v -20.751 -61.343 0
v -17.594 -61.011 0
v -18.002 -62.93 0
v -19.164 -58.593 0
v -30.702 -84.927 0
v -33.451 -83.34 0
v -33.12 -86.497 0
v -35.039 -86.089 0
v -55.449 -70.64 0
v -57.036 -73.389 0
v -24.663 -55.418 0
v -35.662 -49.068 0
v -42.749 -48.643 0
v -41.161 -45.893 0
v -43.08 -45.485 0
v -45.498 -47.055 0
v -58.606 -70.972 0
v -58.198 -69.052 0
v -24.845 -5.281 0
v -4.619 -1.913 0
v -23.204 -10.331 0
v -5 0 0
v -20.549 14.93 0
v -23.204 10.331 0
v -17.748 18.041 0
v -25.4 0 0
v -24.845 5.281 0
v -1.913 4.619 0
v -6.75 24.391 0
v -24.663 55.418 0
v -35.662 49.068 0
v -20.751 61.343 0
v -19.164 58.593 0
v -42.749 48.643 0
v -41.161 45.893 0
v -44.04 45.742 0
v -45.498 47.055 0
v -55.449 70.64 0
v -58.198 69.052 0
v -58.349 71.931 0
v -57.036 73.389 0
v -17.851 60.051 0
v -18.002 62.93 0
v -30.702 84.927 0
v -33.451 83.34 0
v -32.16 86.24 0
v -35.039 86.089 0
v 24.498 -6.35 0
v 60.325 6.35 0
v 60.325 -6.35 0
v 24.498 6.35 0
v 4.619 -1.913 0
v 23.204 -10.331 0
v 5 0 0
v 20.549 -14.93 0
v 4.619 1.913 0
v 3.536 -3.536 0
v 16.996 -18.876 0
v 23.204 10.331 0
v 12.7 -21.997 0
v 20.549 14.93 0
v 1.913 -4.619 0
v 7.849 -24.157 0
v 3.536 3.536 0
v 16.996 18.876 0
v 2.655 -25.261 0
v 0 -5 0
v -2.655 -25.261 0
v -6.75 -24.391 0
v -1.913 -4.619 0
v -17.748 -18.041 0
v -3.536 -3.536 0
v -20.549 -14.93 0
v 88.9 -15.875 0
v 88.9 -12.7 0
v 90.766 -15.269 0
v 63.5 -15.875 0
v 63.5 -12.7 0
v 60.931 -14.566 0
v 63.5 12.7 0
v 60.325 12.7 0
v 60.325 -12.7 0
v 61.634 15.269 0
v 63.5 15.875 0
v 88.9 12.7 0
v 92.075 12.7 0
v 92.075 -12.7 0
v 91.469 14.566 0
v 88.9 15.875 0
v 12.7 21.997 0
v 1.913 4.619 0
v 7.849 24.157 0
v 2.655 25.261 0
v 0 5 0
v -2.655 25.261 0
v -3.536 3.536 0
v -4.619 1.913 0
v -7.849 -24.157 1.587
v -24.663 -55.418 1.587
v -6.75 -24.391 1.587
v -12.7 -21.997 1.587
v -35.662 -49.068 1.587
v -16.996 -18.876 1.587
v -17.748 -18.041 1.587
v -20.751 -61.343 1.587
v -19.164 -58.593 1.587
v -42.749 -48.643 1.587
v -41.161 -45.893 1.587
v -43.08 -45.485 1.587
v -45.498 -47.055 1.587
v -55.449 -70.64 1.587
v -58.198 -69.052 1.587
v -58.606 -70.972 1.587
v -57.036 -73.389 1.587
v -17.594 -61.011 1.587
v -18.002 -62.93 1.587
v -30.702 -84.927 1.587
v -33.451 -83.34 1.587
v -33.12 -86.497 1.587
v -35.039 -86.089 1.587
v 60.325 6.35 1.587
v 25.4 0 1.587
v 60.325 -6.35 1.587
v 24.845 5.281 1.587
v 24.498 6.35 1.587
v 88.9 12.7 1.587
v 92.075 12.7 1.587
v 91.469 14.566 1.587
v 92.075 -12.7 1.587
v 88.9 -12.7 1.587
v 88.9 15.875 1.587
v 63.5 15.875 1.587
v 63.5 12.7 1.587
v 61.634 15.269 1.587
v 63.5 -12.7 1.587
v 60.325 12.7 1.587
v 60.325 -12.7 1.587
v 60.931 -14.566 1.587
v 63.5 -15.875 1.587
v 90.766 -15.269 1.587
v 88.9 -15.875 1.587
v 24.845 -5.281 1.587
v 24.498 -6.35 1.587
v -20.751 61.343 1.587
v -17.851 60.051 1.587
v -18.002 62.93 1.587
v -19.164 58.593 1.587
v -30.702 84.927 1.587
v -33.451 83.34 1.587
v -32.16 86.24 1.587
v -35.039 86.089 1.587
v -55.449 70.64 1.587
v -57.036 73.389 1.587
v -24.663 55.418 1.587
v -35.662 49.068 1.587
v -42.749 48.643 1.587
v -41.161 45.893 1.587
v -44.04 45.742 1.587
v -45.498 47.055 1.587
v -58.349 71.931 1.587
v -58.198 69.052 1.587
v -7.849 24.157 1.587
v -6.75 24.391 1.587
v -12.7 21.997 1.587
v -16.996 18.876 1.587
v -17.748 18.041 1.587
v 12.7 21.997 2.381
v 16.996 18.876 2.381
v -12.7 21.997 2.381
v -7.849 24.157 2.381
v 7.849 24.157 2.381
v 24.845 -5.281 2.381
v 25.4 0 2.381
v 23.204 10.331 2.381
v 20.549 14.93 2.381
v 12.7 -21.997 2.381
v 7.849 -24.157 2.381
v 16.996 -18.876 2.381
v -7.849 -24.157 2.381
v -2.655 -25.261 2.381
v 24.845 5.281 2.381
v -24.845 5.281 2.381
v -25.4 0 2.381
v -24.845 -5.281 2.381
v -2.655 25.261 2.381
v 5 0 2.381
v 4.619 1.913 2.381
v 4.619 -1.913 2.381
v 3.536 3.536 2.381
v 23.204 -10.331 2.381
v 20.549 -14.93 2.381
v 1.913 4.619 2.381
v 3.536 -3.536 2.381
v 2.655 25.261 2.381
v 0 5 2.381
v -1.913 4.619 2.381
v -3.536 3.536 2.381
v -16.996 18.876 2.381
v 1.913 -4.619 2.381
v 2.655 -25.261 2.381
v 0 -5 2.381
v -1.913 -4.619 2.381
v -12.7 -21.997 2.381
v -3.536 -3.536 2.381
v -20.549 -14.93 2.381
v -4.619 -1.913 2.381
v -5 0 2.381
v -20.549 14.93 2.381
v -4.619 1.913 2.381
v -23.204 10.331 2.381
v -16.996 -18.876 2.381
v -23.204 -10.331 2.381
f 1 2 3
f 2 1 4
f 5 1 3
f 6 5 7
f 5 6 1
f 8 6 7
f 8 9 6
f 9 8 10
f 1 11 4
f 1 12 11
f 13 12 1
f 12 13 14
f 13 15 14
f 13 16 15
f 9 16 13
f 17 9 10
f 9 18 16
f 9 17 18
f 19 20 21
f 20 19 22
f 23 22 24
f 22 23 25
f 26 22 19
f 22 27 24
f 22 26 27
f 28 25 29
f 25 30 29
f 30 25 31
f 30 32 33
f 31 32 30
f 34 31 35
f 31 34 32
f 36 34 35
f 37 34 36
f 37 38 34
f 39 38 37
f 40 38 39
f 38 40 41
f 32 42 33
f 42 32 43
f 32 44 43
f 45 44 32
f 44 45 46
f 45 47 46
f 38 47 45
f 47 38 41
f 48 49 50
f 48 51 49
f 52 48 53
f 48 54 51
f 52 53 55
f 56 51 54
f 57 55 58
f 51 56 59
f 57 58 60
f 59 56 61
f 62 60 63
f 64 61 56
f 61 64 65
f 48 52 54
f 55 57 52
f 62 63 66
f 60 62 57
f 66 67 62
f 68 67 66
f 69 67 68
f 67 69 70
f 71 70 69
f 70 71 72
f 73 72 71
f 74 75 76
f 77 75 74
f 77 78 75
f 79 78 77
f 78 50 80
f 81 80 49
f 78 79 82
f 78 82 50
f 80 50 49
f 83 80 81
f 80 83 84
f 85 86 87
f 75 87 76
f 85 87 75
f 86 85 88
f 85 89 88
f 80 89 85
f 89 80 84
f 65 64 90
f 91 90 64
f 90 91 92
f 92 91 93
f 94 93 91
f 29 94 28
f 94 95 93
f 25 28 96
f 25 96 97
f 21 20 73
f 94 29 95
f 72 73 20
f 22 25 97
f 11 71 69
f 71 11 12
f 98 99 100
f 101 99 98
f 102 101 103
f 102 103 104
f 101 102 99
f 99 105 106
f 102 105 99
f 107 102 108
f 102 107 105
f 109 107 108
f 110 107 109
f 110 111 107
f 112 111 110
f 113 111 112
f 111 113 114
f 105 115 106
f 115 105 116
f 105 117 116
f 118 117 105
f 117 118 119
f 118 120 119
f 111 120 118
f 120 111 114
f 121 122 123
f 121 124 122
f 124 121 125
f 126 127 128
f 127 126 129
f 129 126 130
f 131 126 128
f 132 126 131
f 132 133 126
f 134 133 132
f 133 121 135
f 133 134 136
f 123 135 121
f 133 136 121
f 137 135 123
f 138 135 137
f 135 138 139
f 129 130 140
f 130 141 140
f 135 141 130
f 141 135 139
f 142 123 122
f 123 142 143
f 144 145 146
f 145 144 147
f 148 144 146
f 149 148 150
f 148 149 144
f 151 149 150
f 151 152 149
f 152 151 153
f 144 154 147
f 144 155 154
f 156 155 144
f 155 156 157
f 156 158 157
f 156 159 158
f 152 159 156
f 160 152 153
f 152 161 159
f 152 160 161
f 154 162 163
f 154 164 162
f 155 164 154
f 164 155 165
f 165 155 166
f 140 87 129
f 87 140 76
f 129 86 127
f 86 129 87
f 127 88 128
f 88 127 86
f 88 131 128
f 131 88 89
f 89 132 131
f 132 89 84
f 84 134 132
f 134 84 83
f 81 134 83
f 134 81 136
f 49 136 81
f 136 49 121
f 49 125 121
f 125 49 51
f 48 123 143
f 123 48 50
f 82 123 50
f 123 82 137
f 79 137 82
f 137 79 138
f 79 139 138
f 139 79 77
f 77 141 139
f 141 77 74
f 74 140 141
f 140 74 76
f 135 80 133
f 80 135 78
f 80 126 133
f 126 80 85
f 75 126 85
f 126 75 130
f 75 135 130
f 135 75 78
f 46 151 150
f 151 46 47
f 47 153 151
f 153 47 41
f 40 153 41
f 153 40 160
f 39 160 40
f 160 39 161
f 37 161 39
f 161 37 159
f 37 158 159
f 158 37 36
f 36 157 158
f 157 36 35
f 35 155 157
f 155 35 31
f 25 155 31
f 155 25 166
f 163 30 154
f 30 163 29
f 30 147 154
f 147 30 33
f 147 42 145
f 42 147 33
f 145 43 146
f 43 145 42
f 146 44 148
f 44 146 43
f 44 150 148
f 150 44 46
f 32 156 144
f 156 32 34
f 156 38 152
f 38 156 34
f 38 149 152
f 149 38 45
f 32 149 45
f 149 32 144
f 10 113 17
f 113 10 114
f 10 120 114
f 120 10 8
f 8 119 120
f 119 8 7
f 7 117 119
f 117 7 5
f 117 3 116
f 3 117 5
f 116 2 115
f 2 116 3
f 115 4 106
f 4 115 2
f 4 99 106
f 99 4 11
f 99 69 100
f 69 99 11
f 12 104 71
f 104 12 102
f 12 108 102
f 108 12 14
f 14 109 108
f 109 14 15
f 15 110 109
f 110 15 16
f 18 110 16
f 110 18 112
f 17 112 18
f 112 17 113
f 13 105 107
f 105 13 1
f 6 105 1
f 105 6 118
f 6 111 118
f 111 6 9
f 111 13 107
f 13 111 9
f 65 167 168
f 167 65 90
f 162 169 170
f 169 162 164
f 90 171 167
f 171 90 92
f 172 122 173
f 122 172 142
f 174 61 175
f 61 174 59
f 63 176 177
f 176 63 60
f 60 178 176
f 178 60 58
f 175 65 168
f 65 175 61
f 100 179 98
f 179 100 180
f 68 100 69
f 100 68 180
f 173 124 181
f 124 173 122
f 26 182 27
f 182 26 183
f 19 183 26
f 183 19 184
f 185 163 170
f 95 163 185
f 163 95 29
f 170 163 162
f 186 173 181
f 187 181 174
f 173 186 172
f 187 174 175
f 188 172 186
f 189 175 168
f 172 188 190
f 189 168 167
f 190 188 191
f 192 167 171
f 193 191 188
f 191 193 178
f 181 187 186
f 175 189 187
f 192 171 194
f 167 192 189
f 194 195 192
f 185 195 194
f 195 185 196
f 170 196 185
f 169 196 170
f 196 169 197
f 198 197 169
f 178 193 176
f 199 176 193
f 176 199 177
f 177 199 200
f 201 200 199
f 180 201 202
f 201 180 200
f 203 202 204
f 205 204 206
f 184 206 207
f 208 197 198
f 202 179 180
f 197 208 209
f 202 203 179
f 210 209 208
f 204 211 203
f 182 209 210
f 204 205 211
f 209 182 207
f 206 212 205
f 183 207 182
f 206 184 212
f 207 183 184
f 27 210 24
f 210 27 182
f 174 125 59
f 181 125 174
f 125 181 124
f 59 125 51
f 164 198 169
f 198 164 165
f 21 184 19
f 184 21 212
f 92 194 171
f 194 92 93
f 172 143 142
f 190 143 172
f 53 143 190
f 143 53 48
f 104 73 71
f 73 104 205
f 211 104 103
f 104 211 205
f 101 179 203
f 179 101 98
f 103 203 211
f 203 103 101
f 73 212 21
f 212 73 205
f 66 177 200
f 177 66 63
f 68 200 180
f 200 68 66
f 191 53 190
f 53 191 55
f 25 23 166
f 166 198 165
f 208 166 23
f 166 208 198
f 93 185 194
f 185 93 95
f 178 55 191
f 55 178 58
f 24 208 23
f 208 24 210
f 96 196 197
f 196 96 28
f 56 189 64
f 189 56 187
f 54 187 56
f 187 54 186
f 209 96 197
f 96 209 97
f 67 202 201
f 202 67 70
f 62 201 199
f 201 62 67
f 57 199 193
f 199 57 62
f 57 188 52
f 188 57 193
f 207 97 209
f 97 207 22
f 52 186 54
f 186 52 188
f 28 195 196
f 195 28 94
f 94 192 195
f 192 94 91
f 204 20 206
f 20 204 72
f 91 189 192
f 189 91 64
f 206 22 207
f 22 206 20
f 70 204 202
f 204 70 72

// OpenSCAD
module no_more_customizer() {}

mmPerInch = 25.4;

mount_hole_diameter_mm = 10;
mount_brace_diameter_mm = 2 * mmPerInch;
mount_brace_height = mmPerInch * 3/32;
skid_pad_horz_mm = 25.4;
skid_pad_vert_mm = 25.4;
skid_pad_thickness_mm = mmPerInch * 1/16; // half height of the pad itself
skid_pad_radial_from_center = 3 * mmPerInch;
skid_pad_width_around_pad = mmPerInch * 1/ 8;
spoke_width = 0.5 * mmPerInch;

difference()
{
    union()
    {
        cylinder(d=mount_brace_diameter_mm, h = mount_brace_height);
        for (r = [0, 120, 240]) rotate([0,0,r])
        difference()
        {
            linear_extrude(height = skid_pad_thickness_mm)
            {
                translate([skid_pad_radial_from_center/2, 0])
                    square([skid_pad_radial_from_center, spoke_width], center = true);
                translate([skid_pad_radial_from_center, 0])
                    offset(skid_pad_width_around_pad)
                        square([skid_pad_horz_mm, skid_pad_vert_mm], center = true);
            }
            translate([0,0,-.1])
            linear_extrude(height = skid_pad_thickness_mm+.2)
                translate([skid_pad_radial_from_center, 0])
                        square([skid_pad_horz_mm, skid_pad_vert_mm], center = true);
       }
    }
    translate([0,0,-.1])
    cylinder(d = mount_hole_diameter_mm, h = mount_brace_height + .2);
}
